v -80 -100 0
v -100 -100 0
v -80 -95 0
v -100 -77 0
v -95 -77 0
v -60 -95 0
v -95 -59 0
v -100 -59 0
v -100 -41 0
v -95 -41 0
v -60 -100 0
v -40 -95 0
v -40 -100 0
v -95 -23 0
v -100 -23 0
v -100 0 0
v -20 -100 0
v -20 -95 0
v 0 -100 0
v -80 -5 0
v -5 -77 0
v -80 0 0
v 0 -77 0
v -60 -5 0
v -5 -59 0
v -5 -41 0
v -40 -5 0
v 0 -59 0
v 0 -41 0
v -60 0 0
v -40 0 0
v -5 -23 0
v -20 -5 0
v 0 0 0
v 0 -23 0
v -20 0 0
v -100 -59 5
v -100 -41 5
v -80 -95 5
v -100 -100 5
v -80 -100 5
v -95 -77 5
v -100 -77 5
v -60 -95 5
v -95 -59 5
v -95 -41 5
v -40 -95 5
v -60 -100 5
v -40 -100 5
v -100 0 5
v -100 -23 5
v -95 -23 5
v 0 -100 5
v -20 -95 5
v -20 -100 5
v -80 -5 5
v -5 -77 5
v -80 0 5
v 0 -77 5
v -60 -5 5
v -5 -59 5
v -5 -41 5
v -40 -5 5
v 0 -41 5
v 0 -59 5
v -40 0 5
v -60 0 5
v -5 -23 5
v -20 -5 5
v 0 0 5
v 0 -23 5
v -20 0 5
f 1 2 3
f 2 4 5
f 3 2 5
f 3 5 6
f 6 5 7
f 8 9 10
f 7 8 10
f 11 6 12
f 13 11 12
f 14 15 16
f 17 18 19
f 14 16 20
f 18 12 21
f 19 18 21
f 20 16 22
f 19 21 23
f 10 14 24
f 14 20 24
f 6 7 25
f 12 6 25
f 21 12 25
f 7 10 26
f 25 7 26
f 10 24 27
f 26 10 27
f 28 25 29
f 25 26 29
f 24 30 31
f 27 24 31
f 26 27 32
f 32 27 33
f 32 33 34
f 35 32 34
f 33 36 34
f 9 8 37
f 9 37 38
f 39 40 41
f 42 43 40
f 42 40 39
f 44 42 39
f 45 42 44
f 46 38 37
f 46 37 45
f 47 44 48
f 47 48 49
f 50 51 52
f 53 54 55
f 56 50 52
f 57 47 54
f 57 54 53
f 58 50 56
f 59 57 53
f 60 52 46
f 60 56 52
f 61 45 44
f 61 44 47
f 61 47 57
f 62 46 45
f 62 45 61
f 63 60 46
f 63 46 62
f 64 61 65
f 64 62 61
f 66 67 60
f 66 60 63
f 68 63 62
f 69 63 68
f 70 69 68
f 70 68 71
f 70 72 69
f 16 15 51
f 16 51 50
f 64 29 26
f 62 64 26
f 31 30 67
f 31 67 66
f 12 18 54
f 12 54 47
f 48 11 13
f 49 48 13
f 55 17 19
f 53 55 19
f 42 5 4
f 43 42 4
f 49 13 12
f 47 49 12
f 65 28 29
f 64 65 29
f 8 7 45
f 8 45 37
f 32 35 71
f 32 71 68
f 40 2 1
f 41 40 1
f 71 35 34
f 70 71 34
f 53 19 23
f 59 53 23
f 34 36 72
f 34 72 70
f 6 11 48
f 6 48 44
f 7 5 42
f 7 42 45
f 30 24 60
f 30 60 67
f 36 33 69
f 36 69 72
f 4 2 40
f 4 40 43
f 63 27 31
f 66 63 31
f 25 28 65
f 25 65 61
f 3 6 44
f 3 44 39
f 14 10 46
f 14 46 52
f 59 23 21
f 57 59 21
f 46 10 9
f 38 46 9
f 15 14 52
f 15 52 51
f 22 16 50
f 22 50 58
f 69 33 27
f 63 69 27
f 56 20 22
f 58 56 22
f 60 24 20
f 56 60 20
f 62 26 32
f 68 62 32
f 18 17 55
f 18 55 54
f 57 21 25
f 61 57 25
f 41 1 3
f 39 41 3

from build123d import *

# Parameters (mm, degrees)
ESQUISSE1_W             = 100
ESQUISSE1_H             = 100
BOSS_EXTRU_1_DEPTH      = 5
ESQUISSE2_W             = 20
ESQUISSE2_H             = 5
ESQUISSE2_W_2           = 5
ESQUISSE2_H_2           = 18
ENL_V_MAT_EXTRU_1_DEPTH = 5


with BuildPart() as part:
    # Esquisse1 → Boss.-Extru.1 (new body)
    with BuildSketch(Plane.XY):
        with Locations((-50, -50)):
            Rectangle(ESQUISSE1_W, ESQUISSE1_H)
    extrude(amount=BOSS_EXTRU_1_DEPTH)

    # Esquisse2 → Enlèv. mat.-Extru.1 (cut)
    with BuildSketch(Plane(origin=(0, 0, 0), x_dir=(-1, 0, 0), z_dir=(0, 0, -1))):
        with Locations((70, -97.5)):
            Rectangle(ESQUISSE2_W, ESQUISSE2_H)
        with Locations((30, -97.5)):
            Rectangle(ESQUISSE2_W, ESQUISSE2_H)
        with Locations((30, -2.5)):
            Rectangle(ESQUISSE2_W, ESQUISSE2_H)
        with Locations((70, -2.5)):
            Rectangle(ESQUISSE2_W, ESQUISSE2_H)
        with Locations((97.5, -68)):
            Rectangle(ESQUISSE2_W_2, ESQUISSE2_H_2)
        with Locations((97.5, -32)):
            Rectangle(ESQUISSE2_W_2, ESQUISSE2_H_2)
        with Locations((2.5, -32)):
            Rectangle(ESQUISSE2_W_2, ESQUISSE2_H_2)
        with Locations((2.5, -68)):
            Rectangle(ESQUISSE2_W_2, ESQUISSE2_H_2)
    extrude(amount=-ENL_V_MAT_EXTRU_1_DEPTH, mode=Mode.SUBTRACT)


solid = part.part
